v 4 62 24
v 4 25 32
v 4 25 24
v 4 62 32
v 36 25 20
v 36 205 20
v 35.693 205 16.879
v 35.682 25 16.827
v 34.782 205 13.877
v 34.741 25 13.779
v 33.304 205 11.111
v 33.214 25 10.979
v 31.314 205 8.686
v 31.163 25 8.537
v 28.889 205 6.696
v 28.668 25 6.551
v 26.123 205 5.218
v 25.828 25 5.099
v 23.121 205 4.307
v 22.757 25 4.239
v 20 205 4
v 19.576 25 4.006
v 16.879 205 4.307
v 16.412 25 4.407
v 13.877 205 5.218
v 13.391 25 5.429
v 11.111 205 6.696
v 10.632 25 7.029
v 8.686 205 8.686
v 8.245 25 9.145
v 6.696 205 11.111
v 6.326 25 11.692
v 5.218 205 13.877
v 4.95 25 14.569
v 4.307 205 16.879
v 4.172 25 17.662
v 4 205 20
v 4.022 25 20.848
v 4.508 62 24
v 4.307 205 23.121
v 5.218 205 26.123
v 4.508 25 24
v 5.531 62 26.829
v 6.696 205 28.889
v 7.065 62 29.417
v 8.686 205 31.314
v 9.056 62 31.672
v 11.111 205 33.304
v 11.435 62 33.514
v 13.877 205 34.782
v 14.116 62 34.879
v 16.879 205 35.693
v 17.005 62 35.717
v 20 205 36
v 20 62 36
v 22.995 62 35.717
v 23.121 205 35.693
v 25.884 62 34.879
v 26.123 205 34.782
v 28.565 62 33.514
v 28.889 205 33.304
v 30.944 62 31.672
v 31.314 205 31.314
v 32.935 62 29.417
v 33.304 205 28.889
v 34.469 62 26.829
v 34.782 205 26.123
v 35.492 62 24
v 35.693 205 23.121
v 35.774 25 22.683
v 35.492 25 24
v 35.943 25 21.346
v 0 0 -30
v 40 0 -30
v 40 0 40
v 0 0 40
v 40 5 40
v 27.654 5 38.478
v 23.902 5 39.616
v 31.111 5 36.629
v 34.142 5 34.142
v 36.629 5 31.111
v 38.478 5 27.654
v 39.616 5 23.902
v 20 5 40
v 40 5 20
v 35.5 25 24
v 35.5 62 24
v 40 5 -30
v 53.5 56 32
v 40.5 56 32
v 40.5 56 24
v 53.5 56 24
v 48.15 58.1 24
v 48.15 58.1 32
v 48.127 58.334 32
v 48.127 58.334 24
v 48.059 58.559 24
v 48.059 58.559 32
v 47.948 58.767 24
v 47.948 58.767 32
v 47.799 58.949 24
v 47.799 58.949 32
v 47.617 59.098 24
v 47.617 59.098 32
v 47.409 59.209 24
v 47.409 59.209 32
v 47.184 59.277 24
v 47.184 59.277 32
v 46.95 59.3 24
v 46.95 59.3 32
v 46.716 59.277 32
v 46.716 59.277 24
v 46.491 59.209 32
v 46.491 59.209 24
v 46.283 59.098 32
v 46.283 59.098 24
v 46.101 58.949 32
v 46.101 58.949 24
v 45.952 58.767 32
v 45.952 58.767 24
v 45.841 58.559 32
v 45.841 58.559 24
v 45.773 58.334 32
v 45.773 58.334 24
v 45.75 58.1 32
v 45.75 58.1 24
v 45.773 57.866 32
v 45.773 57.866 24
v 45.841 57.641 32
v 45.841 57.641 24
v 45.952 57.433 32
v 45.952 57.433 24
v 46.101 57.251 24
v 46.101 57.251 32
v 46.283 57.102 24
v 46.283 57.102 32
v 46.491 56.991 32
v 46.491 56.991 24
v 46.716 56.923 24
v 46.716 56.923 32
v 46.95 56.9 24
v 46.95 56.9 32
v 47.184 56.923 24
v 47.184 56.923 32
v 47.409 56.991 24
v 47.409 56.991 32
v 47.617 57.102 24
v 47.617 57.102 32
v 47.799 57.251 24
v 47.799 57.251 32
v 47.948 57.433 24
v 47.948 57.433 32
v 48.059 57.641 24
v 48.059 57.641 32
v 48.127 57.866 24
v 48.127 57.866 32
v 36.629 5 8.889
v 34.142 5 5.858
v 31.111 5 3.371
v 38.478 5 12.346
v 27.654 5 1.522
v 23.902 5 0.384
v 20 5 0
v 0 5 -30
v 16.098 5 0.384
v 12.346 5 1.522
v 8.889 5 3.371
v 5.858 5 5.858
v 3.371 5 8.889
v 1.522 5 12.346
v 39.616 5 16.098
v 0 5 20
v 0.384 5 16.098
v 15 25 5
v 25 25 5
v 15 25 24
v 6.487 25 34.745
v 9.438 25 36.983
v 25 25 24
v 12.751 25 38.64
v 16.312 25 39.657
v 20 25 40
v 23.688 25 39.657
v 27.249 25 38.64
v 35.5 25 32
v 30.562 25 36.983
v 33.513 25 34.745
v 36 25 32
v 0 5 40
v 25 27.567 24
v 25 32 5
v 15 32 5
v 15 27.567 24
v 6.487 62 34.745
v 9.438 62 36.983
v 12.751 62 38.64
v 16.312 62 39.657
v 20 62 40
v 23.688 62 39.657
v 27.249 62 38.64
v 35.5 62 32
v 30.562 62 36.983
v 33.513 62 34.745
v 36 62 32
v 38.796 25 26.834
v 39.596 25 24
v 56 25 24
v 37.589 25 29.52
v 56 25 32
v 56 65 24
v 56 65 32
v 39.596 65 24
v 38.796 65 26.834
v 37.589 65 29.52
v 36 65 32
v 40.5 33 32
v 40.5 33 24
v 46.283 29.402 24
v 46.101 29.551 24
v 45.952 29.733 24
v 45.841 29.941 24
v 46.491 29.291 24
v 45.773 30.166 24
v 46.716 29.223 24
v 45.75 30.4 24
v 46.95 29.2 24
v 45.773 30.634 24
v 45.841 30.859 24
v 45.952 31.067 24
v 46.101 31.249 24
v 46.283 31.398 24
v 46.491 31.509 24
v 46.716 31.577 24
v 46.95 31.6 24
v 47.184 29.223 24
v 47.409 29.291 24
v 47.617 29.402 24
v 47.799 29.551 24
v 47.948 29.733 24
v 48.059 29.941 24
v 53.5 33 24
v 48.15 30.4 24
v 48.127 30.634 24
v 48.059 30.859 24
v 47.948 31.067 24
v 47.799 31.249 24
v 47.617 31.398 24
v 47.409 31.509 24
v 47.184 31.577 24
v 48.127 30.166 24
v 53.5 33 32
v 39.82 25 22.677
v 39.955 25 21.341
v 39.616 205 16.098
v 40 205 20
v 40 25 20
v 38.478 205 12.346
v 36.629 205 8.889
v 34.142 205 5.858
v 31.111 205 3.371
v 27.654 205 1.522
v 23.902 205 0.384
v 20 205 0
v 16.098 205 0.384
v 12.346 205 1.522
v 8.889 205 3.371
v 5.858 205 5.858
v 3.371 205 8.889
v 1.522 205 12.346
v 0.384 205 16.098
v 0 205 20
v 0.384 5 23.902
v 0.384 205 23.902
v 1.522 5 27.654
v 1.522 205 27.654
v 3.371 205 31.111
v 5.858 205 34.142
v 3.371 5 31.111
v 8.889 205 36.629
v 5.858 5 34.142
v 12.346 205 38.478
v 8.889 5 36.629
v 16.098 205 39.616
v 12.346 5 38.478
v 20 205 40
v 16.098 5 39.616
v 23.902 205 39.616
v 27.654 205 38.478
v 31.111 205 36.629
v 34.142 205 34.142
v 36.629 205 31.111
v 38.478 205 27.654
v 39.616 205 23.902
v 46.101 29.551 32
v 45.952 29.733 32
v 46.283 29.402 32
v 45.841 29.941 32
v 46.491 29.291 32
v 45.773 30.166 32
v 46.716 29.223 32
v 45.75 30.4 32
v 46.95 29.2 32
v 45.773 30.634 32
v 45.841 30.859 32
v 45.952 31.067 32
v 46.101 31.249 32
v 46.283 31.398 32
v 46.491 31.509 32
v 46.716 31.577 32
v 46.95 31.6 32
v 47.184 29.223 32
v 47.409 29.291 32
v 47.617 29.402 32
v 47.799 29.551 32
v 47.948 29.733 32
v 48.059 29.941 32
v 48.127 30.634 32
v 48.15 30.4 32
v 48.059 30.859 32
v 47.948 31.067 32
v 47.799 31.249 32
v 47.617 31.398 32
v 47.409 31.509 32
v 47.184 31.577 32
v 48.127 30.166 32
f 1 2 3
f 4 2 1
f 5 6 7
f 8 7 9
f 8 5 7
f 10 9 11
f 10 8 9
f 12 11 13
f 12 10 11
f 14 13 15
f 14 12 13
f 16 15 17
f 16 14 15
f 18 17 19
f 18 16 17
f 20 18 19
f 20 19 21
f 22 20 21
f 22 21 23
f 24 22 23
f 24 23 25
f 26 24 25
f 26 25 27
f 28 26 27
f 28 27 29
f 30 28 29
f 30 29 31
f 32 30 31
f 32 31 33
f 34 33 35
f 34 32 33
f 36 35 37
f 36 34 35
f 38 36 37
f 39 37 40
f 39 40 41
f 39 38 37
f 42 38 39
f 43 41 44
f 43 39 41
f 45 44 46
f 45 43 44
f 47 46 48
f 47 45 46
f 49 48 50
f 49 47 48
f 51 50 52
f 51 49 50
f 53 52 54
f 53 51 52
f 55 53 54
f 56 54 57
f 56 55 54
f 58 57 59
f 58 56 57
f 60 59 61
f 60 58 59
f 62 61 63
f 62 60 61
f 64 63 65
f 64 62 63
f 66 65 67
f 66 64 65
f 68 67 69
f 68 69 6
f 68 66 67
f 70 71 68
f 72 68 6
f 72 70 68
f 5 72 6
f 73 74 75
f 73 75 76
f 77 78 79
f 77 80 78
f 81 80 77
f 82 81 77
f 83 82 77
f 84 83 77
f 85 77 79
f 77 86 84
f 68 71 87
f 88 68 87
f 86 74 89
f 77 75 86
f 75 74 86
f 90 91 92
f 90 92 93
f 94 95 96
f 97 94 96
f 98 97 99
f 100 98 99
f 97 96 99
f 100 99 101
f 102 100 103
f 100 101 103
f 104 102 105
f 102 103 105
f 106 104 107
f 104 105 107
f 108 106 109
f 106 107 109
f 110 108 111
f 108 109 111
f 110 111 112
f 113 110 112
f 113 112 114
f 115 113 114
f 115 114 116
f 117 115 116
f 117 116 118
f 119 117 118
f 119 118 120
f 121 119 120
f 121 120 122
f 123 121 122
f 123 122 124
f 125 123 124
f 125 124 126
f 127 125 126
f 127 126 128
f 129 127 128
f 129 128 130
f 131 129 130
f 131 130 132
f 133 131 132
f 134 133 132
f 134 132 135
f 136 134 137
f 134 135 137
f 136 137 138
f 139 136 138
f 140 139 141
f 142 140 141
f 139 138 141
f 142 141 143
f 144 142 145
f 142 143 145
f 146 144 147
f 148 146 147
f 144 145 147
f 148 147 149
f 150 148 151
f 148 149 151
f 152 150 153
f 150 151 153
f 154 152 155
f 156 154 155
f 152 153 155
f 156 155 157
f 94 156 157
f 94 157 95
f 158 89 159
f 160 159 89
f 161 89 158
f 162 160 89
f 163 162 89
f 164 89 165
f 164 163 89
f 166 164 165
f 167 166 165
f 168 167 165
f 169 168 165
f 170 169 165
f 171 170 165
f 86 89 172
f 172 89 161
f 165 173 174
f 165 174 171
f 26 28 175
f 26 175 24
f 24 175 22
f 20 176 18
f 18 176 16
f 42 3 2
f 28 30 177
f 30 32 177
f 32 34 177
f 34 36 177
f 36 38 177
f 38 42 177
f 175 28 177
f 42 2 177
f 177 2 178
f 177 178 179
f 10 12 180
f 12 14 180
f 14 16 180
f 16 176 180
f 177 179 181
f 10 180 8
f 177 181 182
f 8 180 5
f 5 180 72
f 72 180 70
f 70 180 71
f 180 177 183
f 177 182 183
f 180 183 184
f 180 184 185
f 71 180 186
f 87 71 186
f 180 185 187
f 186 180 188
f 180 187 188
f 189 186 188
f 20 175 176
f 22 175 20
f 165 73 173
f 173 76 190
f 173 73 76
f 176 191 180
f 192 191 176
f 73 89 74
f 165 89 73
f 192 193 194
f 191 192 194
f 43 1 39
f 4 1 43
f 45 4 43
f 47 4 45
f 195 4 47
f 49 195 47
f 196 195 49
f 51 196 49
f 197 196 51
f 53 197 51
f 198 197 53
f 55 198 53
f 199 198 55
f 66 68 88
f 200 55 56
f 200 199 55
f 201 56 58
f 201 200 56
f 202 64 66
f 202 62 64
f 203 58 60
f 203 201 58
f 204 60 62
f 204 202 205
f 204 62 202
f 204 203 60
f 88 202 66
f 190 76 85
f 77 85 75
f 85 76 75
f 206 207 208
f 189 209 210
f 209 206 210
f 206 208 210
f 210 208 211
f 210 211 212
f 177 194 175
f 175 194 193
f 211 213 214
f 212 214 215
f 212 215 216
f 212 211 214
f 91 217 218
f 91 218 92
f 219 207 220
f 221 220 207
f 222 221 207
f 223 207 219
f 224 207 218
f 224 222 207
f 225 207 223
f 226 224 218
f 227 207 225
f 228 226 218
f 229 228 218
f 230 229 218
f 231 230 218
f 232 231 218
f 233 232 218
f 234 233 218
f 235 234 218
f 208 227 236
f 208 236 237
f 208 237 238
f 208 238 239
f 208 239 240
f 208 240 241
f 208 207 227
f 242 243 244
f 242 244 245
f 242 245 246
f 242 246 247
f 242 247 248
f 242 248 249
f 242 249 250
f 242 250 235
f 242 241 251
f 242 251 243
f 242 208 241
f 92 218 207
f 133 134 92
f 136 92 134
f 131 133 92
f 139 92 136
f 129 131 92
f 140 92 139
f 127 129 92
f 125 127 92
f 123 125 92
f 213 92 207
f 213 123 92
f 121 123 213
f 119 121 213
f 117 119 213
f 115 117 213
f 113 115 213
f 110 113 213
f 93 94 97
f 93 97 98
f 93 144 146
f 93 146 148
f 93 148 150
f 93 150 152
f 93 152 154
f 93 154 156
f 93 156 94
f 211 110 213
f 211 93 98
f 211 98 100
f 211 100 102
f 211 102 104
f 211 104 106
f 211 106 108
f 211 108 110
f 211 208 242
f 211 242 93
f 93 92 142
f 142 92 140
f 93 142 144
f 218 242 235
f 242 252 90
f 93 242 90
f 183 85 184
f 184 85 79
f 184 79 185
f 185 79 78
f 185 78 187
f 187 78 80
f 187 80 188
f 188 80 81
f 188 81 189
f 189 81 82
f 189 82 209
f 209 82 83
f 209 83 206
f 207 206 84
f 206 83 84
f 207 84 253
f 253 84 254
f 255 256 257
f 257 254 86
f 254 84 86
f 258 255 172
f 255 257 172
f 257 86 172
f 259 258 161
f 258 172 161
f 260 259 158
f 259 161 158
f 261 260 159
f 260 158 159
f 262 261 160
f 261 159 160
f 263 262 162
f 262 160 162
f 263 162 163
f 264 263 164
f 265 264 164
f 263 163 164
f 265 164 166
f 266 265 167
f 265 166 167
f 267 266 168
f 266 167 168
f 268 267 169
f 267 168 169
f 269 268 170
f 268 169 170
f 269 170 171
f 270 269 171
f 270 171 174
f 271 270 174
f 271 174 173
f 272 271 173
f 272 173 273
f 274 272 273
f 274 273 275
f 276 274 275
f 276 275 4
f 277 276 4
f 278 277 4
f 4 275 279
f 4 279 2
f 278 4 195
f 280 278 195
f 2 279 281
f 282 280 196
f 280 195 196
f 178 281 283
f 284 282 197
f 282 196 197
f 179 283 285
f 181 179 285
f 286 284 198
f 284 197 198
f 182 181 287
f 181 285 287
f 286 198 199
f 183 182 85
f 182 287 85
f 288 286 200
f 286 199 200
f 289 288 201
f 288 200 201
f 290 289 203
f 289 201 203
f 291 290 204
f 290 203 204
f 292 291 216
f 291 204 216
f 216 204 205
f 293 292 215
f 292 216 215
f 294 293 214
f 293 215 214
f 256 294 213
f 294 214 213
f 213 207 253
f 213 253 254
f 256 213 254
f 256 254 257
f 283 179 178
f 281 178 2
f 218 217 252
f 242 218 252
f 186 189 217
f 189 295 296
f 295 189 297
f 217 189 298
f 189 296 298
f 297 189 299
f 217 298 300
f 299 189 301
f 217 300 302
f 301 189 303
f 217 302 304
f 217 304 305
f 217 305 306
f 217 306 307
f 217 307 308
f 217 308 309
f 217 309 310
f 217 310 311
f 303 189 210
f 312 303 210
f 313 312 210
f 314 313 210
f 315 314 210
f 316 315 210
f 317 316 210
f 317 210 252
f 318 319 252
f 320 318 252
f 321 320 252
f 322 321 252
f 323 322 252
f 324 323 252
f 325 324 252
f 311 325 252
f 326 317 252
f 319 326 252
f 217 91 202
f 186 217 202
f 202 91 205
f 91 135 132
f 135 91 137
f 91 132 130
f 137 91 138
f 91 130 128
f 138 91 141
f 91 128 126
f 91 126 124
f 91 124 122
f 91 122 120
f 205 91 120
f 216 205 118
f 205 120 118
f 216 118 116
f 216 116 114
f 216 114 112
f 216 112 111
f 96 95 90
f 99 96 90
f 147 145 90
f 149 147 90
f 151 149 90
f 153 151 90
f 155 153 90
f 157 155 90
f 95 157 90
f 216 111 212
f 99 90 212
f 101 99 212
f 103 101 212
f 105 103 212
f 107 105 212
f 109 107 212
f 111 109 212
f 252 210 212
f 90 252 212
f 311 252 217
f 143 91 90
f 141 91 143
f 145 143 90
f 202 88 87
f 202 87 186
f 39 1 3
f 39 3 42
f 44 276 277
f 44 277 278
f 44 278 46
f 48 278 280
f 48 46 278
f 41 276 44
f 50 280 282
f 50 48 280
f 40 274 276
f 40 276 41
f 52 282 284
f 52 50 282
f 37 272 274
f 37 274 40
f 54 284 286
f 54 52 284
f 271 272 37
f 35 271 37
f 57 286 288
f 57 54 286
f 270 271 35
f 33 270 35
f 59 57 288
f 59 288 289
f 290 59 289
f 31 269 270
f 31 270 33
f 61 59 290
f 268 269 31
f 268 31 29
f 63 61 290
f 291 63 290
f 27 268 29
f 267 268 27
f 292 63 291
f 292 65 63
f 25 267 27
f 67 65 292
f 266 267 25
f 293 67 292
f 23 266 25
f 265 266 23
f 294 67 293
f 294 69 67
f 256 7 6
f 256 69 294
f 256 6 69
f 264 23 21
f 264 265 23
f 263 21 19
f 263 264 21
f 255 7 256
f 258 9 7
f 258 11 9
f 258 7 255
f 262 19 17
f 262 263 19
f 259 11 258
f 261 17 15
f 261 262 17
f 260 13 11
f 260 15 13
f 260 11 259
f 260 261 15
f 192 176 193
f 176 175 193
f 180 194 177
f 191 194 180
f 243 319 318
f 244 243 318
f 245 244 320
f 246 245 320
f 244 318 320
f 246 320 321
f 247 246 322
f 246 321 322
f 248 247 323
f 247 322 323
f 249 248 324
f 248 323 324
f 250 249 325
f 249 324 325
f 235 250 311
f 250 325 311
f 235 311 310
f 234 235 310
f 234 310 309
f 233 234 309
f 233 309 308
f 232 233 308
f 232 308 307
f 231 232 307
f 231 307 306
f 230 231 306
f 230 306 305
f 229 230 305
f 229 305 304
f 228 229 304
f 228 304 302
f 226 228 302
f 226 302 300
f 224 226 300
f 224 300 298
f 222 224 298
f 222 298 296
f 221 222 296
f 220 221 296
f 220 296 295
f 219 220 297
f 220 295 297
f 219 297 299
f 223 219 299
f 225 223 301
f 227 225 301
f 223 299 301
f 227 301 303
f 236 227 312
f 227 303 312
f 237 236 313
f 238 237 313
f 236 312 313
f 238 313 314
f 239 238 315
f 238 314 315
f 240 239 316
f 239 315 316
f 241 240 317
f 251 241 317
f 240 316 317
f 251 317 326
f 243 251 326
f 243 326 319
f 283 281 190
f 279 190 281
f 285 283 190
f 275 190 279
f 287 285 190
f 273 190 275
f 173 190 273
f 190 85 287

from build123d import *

# Parameters (mm, degrees)
SKETCH1_W                = 40
SKETCH1_H                = 40
BOSS_EXTRUDE1_DEPTH      = 5
SKETCH2_R                = 20
BOSS_EXTRUDE2_DEPTH      = 20
BOSS_EXTRUDE3_DEPTH      = 5
SKETCH6_R                = 20
SKETCH6_R_2              = 16
EXTRUDE_THIN1_DEPTH      = 180
SKETCH7_W                = 32
SKETCH7_H                = 37
CUT_EXTRUDE1_DEPTH       = 16
BOSS_EXTRUDE4_DEPTH      = 0.5
BOSS_EXTRUDE4_DEPTH_BACK = 20
SKETCH8_W                = 8
SKETCH8_H                = 40
SKETCH12_W               = 40
SKETCH12_H               = 5
BOSS_EXTRUDE5_DEPTH      = 30
SKETCH10_W               = 13
SKETCH10_H               = 23
CUT_EXTRUDE2_DEPTH       = 20
SKETCH11_R               = 1.2
CUT_EXTRUDE3_DEPTH       = 10


with BuildPart() as part:
    # Sketch1 → Boss-Extrude1 (new body)
    with BuildSketch(Plane(origin=(0, 0, 0), x_dir=(1, 0, 0), z_dir=(0, 1, 0))):
        with Locations((20, -20)):
            Rectangle(SKETCH1_W, SKETCH1_H)
    extrude(amount=BOSS_EXTRUDE1_DEPTH)

    # Sketch2 → Boss-Extrude2 (add)
    with BuildSketch(Plane(origin=(0, 5, 0), x_dir=(1, 0, 0), z_dir=(0, 1, 0))):
        with Locations(Location((20, -20, 0), (0, 0, 270))):
            Circle(SKETCH2_R)
    extrude(amount=BOSS_EXTRUDE2_DEPTH)

    # Sketch4 → Boss-Extrude3 (add, symmetric)
    with BuildSketch(Plane.ZY.offset(-20)):
        Polygon((35, 25), (5, 25), (5, 32), align=None)
    extrude(amount=BOSS_EXTRUDE3_DEPTH, both=True)

    # Sketch6 → Extrude-Thin1 (add)
    with BuildSketch(Plane(origin=(0, 25, 0), x_dir=(1, 0, 0), z_dir=(0, 1, 0))):
        with Locations((20, -20)):
            Circle(SKETCH6_R)
        with Locations((20, -20)):
            Circle(SKETCH6_R_2, mode=Mode.SUBTRACT)
    extrude(amount=EXTRUDE_THIN1_DEPTH)

    # Sketch7 → Cut-Extrude1 (cut)
    with BuildSketch(Plane.XY.offset(40)):
        with Locations((20, 43.5)):
            Rectangle(SKETCH7_W, SKETCH7_H)
    extrude(amount=-CUT_EXTRUDE1_DEPTH, mode=Mode.SUBTRACT)

    # Sketch8 → Boss-Extrude4 (add, two sides: drawn at the far end of the back side and taken through both)
    with BuildSketch(Plane.ZY.offset(-36).offset(-BOSS_EXTRUDE4_DEPTH_BACK)):
        with Locations((28, 45)):
            Rectangle(SKETCH8_W, SKETCH8_H)
    extrude(amount=BOSS_EXTRUDE4_DEPTH + BOSS_EXTRUDE4_DEPTH_BACK)

    # Sketch12 → Boss-Extrude5 (add)
    with BuildSketch(Plane(origin=(0, 0, 0), x_dir=(-1, 0, 0), z_dir=(0, 0, -1))):
        with Locations((-20, 2.5)):
            Rectangle(SKETCH12_W, SKETCH12_H)
    extrude(amount=BOSS_EXTRUDE5_DEPTH)

    # Sketch10 → Cut-Extrude2 (cut)
    with BuildSketch(Plane.XY.offset(32)):
        with Locations((47, 44.5)):
            Rectangle(SKETCH10_W, SKETCH10_H)
    extrude(amount=-CUT_EXTRUDE2_DEPTH, mode=Mode.SUBTRACT)

    # Sketch11 → Cut-Extrude3 (cut)
    with BuildSketch(Plane.XY.offset(32)):
        with Locations((46.95, 30.4)):
            Circle(SKETCH11_R)
        with Locations((46.95, 58.1)):
            Circle(SKETCH11_R)
    extrude(amount=-CUT_EXTRUDE3_DEPTH, mode=Mode.SUBTRACT)


solid = part.part
